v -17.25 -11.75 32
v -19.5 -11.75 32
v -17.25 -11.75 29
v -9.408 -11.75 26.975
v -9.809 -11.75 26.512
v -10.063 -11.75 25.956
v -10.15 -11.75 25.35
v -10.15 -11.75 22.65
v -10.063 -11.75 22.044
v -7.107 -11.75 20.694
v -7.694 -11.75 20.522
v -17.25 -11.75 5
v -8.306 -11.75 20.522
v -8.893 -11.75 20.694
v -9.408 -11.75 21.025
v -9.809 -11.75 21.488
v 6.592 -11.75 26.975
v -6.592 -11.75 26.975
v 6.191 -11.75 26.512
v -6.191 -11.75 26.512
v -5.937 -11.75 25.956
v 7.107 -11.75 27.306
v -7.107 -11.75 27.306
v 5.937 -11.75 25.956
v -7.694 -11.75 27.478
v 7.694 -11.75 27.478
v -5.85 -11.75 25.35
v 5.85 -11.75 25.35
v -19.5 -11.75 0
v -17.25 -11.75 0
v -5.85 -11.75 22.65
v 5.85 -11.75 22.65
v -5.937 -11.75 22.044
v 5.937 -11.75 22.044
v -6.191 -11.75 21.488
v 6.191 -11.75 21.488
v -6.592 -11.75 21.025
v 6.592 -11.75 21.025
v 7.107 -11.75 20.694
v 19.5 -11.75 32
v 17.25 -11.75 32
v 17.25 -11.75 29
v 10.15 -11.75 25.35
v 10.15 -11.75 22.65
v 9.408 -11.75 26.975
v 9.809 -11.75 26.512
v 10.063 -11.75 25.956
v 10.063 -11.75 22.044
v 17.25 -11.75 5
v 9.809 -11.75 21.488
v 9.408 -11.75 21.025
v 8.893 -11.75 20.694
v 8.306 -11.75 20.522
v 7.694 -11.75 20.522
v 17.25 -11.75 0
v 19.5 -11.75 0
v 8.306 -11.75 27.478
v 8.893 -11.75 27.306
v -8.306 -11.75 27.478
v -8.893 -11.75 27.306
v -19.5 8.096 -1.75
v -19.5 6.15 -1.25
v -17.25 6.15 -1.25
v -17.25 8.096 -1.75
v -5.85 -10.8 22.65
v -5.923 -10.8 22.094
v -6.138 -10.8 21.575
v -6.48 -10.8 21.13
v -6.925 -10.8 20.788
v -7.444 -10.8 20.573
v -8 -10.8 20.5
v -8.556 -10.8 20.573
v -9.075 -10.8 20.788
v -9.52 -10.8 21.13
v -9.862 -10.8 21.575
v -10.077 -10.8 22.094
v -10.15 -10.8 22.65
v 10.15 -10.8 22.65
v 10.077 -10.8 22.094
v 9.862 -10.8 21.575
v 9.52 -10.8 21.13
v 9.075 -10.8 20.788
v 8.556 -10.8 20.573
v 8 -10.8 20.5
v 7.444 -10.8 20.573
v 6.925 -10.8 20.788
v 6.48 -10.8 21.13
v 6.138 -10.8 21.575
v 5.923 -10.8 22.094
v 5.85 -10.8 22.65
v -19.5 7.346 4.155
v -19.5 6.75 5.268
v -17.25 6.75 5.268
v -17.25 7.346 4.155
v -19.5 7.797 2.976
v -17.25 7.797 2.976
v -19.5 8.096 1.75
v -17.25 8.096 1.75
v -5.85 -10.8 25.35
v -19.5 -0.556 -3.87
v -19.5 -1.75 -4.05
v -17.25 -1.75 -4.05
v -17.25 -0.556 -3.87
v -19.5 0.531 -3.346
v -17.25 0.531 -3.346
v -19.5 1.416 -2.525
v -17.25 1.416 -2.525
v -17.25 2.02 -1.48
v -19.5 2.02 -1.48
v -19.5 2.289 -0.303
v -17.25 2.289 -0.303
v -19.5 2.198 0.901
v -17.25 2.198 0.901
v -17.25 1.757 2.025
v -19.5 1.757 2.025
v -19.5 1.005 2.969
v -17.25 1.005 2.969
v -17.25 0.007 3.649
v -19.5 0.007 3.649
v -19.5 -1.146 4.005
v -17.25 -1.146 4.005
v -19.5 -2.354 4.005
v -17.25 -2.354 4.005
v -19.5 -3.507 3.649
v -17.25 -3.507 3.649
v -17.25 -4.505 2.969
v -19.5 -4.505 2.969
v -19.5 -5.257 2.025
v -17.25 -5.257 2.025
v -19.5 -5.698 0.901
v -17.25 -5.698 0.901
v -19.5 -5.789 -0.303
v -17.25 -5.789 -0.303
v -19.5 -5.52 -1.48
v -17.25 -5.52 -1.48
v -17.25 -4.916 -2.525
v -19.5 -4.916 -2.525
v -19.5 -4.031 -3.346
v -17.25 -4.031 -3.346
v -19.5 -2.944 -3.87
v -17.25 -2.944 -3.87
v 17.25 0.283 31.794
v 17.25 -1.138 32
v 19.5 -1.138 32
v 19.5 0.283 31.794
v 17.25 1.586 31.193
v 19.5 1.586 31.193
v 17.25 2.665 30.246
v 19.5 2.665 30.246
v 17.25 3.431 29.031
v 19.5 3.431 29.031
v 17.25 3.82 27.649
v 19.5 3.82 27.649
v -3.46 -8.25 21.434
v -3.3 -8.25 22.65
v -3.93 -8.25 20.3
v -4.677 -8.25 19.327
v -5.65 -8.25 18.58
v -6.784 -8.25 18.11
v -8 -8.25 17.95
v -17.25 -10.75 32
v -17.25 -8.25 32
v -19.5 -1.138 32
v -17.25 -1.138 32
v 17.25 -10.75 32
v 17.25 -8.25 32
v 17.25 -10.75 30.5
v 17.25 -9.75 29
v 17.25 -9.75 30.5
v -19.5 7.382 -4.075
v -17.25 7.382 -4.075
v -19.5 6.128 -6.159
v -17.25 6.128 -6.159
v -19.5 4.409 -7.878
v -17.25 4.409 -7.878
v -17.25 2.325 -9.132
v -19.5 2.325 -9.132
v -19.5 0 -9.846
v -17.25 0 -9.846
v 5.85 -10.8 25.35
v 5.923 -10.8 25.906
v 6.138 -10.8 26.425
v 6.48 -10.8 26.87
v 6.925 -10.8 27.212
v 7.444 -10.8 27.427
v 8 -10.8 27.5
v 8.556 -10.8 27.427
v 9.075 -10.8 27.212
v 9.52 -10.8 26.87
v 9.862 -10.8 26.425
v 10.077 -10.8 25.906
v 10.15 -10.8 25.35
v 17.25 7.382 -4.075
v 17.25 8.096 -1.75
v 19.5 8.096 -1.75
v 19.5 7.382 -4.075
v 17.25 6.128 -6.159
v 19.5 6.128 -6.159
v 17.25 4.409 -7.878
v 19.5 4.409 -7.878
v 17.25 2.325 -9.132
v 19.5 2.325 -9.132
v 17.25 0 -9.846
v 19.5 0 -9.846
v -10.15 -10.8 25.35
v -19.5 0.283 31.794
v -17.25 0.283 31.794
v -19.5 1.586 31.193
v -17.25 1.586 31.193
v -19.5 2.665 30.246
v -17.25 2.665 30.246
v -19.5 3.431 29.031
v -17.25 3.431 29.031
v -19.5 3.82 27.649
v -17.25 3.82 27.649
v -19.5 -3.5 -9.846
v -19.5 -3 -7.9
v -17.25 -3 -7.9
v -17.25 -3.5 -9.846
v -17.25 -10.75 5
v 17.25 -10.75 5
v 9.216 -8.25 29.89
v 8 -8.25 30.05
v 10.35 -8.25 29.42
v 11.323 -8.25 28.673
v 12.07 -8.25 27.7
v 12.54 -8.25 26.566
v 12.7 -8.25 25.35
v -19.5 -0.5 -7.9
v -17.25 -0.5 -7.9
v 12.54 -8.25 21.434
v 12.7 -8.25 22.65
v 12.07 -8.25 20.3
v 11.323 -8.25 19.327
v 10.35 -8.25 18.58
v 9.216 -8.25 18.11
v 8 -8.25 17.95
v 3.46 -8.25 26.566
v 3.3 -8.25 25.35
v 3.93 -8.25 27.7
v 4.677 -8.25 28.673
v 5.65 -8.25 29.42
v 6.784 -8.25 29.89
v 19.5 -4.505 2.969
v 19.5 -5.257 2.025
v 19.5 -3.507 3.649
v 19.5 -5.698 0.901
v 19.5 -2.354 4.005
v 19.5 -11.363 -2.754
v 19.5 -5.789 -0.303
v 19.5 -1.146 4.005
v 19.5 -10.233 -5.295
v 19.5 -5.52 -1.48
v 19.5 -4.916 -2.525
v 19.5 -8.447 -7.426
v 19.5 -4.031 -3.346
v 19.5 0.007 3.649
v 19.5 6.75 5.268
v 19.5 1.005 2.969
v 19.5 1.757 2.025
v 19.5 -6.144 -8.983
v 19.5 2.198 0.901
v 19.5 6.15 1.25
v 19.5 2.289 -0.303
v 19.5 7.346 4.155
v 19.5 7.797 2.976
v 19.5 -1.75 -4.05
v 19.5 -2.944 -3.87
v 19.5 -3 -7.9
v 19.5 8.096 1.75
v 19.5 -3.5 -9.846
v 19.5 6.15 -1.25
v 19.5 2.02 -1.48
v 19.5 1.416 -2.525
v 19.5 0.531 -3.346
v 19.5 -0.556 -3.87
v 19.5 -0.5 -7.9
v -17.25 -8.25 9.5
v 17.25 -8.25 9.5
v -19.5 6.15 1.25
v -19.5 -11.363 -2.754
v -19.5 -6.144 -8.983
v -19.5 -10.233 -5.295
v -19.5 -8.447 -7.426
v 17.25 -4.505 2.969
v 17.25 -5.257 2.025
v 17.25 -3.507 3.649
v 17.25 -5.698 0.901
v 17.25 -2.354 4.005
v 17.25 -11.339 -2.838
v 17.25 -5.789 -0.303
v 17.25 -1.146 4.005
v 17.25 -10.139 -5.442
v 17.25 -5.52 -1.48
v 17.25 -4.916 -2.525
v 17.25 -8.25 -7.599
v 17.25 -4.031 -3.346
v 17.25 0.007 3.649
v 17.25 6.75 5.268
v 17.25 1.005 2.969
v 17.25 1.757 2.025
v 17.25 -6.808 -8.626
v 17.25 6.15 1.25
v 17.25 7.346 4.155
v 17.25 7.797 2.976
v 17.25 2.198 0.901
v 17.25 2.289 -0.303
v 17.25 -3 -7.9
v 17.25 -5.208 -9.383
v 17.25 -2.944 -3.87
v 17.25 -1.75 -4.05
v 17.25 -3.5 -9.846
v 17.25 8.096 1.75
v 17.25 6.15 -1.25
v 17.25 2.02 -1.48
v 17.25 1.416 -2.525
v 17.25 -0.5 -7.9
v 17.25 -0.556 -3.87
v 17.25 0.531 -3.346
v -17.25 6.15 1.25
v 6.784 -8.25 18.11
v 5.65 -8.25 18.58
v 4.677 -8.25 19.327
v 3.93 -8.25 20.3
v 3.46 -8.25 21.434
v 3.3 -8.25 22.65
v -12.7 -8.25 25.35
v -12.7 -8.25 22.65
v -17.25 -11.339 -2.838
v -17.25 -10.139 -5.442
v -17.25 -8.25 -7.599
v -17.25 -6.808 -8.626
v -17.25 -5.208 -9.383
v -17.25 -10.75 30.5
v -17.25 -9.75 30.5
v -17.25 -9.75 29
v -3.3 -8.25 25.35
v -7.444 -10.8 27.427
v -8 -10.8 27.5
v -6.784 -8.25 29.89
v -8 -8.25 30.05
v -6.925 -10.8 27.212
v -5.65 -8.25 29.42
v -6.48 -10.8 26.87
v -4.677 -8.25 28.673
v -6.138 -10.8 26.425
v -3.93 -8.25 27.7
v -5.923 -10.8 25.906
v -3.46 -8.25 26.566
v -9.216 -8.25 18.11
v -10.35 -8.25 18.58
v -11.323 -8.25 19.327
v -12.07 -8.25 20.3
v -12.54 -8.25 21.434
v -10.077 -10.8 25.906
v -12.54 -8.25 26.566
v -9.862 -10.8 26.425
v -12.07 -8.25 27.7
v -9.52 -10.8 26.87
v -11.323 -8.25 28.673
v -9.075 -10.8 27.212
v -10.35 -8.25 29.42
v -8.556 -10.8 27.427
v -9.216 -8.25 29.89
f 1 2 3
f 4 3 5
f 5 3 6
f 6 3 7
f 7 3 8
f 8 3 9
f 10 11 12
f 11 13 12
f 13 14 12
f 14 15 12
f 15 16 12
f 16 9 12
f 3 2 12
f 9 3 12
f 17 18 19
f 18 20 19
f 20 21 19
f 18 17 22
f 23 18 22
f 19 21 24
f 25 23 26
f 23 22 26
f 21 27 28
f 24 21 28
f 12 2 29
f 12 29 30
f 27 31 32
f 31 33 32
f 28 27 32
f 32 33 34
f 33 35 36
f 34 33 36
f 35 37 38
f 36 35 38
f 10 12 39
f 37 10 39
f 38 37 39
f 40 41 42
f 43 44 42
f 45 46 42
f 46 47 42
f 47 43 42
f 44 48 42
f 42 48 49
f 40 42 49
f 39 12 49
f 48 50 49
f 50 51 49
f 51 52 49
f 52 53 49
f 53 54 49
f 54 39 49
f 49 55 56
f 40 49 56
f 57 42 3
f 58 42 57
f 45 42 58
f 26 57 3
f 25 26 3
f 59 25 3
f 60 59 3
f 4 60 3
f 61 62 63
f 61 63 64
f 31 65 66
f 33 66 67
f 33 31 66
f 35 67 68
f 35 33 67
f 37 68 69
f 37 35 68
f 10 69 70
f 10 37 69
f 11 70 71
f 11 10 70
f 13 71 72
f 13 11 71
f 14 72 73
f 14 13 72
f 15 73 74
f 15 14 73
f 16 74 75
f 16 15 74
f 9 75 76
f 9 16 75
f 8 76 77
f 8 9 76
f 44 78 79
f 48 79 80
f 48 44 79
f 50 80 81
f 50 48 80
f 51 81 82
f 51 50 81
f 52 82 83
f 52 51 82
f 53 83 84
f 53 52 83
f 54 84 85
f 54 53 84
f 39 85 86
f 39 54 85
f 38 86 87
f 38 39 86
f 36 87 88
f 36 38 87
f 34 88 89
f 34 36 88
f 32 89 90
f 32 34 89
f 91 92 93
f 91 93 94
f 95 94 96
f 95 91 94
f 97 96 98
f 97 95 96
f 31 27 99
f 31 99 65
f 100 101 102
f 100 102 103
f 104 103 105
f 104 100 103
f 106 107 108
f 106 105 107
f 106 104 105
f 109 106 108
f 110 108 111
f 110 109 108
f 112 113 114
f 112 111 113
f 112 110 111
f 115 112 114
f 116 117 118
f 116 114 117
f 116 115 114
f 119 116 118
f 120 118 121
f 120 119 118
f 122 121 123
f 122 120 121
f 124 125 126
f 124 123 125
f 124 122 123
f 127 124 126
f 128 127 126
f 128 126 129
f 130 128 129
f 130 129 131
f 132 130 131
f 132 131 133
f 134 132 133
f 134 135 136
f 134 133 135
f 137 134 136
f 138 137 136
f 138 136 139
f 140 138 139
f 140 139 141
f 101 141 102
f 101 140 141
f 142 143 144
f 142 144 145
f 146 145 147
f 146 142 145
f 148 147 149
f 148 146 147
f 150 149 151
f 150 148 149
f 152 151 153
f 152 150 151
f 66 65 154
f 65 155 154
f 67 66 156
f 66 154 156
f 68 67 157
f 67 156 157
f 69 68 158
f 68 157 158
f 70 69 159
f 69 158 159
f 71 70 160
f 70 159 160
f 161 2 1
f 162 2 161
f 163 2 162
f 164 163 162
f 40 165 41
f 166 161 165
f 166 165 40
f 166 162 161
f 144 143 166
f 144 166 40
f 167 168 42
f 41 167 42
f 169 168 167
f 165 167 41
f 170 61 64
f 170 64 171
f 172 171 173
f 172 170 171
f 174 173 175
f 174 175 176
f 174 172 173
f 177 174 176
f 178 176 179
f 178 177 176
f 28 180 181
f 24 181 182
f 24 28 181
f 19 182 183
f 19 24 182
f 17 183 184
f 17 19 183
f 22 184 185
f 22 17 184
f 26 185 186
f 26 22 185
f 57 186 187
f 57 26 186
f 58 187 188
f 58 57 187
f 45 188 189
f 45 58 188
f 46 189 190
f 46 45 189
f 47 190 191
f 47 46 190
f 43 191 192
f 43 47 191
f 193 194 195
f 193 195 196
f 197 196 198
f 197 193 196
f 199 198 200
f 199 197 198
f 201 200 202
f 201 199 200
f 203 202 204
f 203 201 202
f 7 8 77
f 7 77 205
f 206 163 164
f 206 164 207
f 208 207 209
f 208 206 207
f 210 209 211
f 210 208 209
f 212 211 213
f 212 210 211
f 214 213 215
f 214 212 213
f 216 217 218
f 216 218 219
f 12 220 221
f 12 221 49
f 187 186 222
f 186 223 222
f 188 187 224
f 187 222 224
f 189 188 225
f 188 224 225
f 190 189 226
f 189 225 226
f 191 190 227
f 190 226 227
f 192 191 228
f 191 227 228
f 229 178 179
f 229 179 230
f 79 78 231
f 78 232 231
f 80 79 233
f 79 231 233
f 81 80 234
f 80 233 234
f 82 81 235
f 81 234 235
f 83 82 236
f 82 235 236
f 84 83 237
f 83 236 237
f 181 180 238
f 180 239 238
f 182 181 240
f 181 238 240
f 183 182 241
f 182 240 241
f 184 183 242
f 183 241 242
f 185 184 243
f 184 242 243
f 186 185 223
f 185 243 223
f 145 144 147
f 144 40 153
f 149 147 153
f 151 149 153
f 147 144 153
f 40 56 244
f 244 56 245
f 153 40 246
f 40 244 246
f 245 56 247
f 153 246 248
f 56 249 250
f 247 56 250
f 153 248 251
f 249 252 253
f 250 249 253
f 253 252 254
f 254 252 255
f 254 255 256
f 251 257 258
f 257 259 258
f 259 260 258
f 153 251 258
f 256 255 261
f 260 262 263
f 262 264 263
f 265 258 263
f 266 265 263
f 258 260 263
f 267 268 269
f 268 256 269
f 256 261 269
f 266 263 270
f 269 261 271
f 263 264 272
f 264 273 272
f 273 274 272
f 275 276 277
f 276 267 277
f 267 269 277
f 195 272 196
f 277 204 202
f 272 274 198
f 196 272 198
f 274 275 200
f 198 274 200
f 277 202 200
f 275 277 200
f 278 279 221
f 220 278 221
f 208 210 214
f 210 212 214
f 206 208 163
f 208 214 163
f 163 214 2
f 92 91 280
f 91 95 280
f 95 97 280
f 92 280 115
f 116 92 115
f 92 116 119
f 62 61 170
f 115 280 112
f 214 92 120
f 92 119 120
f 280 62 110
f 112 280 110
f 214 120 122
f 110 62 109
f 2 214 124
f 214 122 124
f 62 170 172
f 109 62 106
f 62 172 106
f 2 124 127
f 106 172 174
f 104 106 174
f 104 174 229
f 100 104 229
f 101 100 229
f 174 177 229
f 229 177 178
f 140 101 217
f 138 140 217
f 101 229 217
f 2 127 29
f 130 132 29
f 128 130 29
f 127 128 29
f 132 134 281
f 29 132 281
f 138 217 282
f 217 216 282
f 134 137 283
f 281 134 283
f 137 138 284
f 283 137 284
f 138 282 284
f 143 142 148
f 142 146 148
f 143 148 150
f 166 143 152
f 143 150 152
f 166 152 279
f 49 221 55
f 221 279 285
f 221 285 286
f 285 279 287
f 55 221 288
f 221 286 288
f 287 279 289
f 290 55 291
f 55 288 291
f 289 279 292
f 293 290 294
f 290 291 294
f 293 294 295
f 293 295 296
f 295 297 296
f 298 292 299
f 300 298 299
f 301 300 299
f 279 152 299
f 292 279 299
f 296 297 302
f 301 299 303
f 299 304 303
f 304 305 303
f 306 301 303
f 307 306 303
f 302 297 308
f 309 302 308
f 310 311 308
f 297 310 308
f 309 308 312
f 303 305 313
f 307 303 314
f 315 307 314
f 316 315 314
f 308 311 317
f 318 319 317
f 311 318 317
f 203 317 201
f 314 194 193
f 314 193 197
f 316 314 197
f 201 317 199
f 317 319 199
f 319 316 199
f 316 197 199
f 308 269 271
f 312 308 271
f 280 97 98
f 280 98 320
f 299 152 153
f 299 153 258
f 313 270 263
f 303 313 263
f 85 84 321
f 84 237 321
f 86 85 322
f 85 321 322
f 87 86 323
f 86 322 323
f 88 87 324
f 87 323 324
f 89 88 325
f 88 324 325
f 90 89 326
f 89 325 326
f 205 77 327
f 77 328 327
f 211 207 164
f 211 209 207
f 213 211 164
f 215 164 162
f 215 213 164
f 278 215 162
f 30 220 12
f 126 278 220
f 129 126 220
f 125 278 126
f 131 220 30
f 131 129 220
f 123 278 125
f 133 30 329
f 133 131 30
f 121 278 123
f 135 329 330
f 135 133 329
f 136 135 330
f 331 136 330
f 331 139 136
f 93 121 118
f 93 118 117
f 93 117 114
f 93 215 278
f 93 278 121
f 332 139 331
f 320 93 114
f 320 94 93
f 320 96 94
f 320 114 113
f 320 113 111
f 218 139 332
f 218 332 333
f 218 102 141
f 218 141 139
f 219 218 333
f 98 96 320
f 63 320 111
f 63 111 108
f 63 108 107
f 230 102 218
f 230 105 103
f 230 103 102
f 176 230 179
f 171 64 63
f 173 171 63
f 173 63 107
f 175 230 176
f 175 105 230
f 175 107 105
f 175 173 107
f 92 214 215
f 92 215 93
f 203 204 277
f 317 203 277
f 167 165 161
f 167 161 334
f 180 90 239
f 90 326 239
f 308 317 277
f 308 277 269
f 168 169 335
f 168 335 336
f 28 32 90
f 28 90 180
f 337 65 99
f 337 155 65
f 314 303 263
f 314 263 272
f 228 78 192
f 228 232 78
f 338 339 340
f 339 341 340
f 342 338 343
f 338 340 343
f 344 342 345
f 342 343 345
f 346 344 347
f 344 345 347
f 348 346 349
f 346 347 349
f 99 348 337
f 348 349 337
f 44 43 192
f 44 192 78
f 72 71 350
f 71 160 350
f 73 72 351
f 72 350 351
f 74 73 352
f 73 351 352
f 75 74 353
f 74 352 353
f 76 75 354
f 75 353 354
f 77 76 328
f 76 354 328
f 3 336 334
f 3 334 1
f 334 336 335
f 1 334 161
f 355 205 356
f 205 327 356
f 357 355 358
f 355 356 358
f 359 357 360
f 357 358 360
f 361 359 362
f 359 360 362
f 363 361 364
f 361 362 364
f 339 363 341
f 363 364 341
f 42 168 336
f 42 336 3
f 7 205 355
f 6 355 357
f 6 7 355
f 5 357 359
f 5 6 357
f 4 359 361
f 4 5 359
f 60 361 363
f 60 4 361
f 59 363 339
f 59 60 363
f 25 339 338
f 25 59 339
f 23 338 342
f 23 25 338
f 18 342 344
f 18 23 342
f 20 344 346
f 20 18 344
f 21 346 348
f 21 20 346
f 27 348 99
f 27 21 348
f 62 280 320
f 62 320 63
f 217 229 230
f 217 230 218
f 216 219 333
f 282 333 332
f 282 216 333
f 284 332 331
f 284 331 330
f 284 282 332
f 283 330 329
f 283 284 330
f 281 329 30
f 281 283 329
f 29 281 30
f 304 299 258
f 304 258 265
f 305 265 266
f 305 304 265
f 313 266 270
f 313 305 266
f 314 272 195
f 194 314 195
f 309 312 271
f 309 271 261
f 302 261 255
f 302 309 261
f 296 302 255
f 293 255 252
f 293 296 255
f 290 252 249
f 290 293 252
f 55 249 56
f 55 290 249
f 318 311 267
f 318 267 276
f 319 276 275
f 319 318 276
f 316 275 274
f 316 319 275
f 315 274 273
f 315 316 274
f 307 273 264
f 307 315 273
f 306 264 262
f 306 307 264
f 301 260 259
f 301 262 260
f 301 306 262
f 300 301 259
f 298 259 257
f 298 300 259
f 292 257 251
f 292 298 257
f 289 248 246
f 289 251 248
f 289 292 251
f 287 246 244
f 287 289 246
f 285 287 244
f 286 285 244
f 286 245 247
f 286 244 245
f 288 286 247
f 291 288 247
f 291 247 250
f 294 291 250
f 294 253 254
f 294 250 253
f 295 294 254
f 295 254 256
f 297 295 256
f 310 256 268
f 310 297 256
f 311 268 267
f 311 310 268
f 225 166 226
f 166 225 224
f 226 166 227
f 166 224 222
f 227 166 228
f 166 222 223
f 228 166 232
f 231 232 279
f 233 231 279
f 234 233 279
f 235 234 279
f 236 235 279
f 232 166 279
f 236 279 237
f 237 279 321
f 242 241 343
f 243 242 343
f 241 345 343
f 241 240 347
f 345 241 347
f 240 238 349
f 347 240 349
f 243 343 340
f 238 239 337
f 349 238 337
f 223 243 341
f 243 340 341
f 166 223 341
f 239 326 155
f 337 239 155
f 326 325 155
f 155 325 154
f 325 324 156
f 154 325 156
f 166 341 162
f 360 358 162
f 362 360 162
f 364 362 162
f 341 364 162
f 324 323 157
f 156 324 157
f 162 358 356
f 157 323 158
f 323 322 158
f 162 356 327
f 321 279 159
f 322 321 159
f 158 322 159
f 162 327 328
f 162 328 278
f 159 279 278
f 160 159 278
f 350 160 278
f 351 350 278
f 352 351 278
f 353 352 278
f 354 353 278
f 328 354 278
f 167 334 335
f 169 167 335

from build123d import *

# Parameters (mm, degrees)
BODY_DEPTH                                      = 32
BODY_DEPTH_BACK                                 = 15
PIVOT_HOLE_DEPTH                                = 40.272286666
PIVOT_HOLE_DEPTH_BACK                           = 40.272286666
PIVOT_HOLE_SKETCH_R                             = 4.05
OUTSIDE_SHAPE_CUT_OUT_DEPTH                     = 40.272286666
OUTSIDE_SHAPE_CUT_OUT_DEPTH_BACK                = 40.272286666
OUTSIDE_SHAPE_CUT_OUT_SKETCH_W                  = 49
OUTSIDE_SHAPE_CUT_OUT_SKETCH_H                  = 22
INSIDE_START                                    = 17.25
INSIDE_SHAPE_CUT_OUT_DEPTH                      = 34.5
F_2_START                                       = -11.75
F_2_LATERAL_SLOTS_ORIENTED_LONGITUDINALLY_DEPTH = 3.5


with BuildPart() as part:
    # Profile Sketch → Body (new, two sides: drawn at the far end of the back side and taken through both)
    with BuildSketch(Plane.XY.offset(-BODY_DEPTH_BACK)):
        Polygon((-19.5, -11.75), (19.5, -11.75), (19.5, 8.25), (17.25, 8.25), (17.25, -8.25), (-17.25, -8.25), (-17.25, 8.25), (-19.5, 8.25), align=None)
    extrude(amount=BODY_DEPTH + BODY_DEPTH_BACK)

    # Pivot Hole Sketch → Pivot Hole (cut, two sides: drawn at the far end of the back side and taken through both)
    with BuildSketch(Plane(origin=(0, 0, 0), x_dir=(0, 0, -1), z_dir=(1, 0, 0)).offset(-PIVOT_HOLE_DEPTH_BACK)):
        with Locations((0, -1.75)):
            Circle(PIVOT_HOLE_SKETCH_R)
    extrude(amount=PIVOT_HOLE_DEPTH + PIVOT_HOLE_DEPTH_BACK, mode=Mode.SUBTRACT)

    # Outside Shape Cut Out Sketch → Outside Shape Cut Out (cut, two sides: drawn at the far end of the back side and taken through both)
    with BuildSketch(Plane(origin=(0, 0, 0), x_dir=(0, 0, -1), z_dir=(1, 0, 0)).offset(-OUTSIDE_SHAPE_CUT_OUT_DEPTH_BACK)):
        with Locations((-9.5, -2.75)):
            Rectangle(OUTSIDE_SHAPE_CUT_OUT_SKETCH_W, OUTSIDE_SHAPE_CUT_OUT_SKETCH_H)
        with BuildLine():
            Line((-27.649101987, 3.819656009), (-5.267826876, 6.75))
            ThreePointArc((-5.267826876, 6.75), (-3.57284062, 7.589957703), (-1.75, 8.095684334))
            Line((-1.75, 8.095684334), (-1.25, 6.15))
            Line((-1.25, 6.15), (1.25, 6.15))
            Line((1.25, 6.15), (1.75, 8.095684334))
            ThreePointArc((1.75, 8.095684334), (7.071067812, 5.321067812), (9.845684334, 0))
            Line((9.845684334, 0), (7.9, -0.5))
            Line((7.9, -0.5), (7.9, -3))
            Line((7.9, -3), (9.845684334, -3.5))
            ThreePointArc((9.845684334, -3.5), (6.422616289, -9.414854858), (0, -11.75))
            Line((0, -11.75), (-32, -11.75))
            Line((-32, -11.75), (-32, -1.138031619))
            ThreePointArc((-32, -1.138031619), (-30.758025408, 2.160035244), (-27.649101987, 3.819656009))
        make_face(mode=Mode.SUBTRACT)
    extrude(amount=OUTSIDE_SHAPE_CUT_OUT_DEPTH + OUTSIDE_SHAPE_CUT_OUT_DEPTH_BACK, mode=Mode.SUBTRACT)

    # Inside Shape Cut Out Sketch → Inside Shape Cut Out (cut)
    with BuildSketch(Plane(origin=(0, 0, 0), x_dir=(0, 0, -1), z_dir=(1, 0, 0)).offset(INSIDE_START)):
        Polygon((-29, -9.75), (-29, -11.75), (-32, -11.75), (-32, -10.75), (-30.5, -10.75), (-30.5, -9.75), align=None)
        Polygon((-9.5, -8.25), (-5, -10.75), (-5, -11.75), (7.599342077, -11.75), (7.599342077, -8.25), align=None)
    extrude(amount=-INSIDE_SHAPE_CUT_OUT_DEPTH, mode=Mode.SUBTRACT)

    # 2 Lateral Slots Oriented Longitudinally: read off the stored shape, not the designer's step
    # 2 Lateral Slots Oriented Longitudina 2 → 2 Lateral Slots Oriented Longitudinally (cut)
    with BuildSketch(Plane(origin=(0, 0, 0), x_dir=(1, 0, 0), z_dir=(0, 1, 0)).offset(F_2_START)):
        with BuildLine():
            Line((10.15, -25.35), (10.15, -22.65))
            ThreePointArc((10.15, -22.65), (8, -20.5), (5.85, -22.65))
            Line((5.85, -22.65), (5.85, -25.35))
            ThreePointArc((5.85, -25.35), (8, -27.5), (10.15, -25.35))
        make_face()
        with BuildLine():
            Line((-5.85, -25.35), (-5.85, -22.65))
            ThreePointArc((-5.85, -22.65), (-8, -20.5), (-10.15, -22.65))
            Line((-10.15, -22.65), (-10.15, -25.35))
            ThreePointArc((-10.15, -25.35), (-8, -27.5), (-5.85, -25.35))
        make_face()
    extrude(amount=F_2_LATERAL_SLOTS_ORIENTED_LONGITUDINALLY_DEPTH, mode=Mode.SUBTRACT)

    # 2 Lateral Slots Oriented Longitudina 3: loft between two sections, ruled curve by curve
    f_2_lateral_slots_oriented_longitudina_3_from = [
        Edge.make_three_point_arc((10.15, -10.8, 22.65), (9.52027958, -10.8, 21.12972042), (8, -10.8, 20.5)),
        Edge.make_three_point_arc((8, -10.8, 20.5), (6.47972042, -10.8, 21.12972042), (5.85, -10.8, 22.65)),
        Edge.make_three_point_arc((5.85, -10.8, 25.35), (6.47972042, -10.8, 26.87027958), (8, -10.8, 27.5)),
        Edge.make_three_point_arc((8, -10.8, 27.5), (9.52027958, -10.8, 26.87027958), (10.15, -10.8, 25.35)),
        Edge.make_line((5.85, -10.8, 22.65), (5.85, -10.8, 25.35)),
        Edge.make_line((10.15, -10.8, 22.65), (10.15, -10.8, 25.35)),
    ]
    f_2_lateral_slots_oriented_longitudina_3_to = [
        Edge.make_three_point_arc((12.7, -8.25, 22.65), (11.323401872, -8.25, 19.326598128), (8, -8.25, 17.95)),
        Edge.make_three_point_arc((8, -8.25, 17.95), (4.676598128, -8.25, 19.326598128), (3.3, -8.25, 22.65)),
        Edge.make_three_point_arc((3.3, -8.25, 25.35), (4.676598128, -8.25, 28.673401872), (8, -8.25, 30.05)),
        Edge.make_three_point_arc((8, -8.25, 30.05), (11.323401872, -8.25, 28.673401872), (12.7, -8.25, 25.35)),
        Edge.make_line((3.3, -8.25, 22.65), (3.3, -8.25, 25.35)),
        Edge.make_line((12.7, -8.25, 22.65), (12.7, -8.25, 25.35)),
    ]
    f_2_lateral_slots_oriented_longitudina_3 = Solid(Shell([*[Face.make_surface_from_curves(f_2_lateral_slots_oriented_longitudina_3_from[k], f_2_lateral_slots_oriented_longitudina_3_to[k]) for k in range(6)], Face(Wire(f_2_lateral_slots_oriented_longitudina_3_from)), Face(Wire(f_2_lateral_slots_oriented_longitudina_3_to))]))
    add(f_2_lateral_slots_oriented_longitudina_3, mode=Mode.SUBTRACT)

    # 2 Lateral Slots Oriented Longitudina 4: loft between two sections, ruled curve by curve
    f_2_lateral_slots_oriented_longitudina_4_from = [
        Edge.make_three_point_arc((-5.85, -10.8, 22.65), (-6.47972042, -10.8, 21.12972042), (-8, -10.8, 20.5)),
        Edge.make_three_point_arc((-8, -10.8, 20.5), (-9.52027958, -10.8, 21.12972042), (-10.15, -10.8, 22.65)),
        Edge.make_three_point_arc((-10.15, -10.8, 25.35), (-9.52027958, -10.8, 26.87027958), (-8, -10.8, 27.5)),
        Edge.make_three_point_arc((-8, -10.8, 27.5), (-6.47972042, -10.8, 26.87027958), (-5.85, -10.8, 25.35)),
        Edge.make_line((-10.15, -10.8, 22.65), (-10.15, -10.8, 25.35)),
        Edge.make_line((-5.85, -10.8, 22.65), (-5.85, -10.8, 25.35)),
    ]
    f_2_lateral_slots_oriented_longitudina_4_to = [
        Edge.make_three_point_arc((-3.3, -8.25, 22.65), (-4.676598128, -8.25, 19.326598128), (-8, -8.25, 17.95)),
        Edge.make_three_point_arc((-8, -8.25, 17.95), (-11.323401872, -8.25, 19.326598128), (-12.7, -8.25, 22.65)),
        Edge.make_three_point_arc((-12.7, -8.25, 25.35), (-11.323401872, -8.25, 28.673401872), (-8, -8.25, 30.05)),
        Edge.make_three_point_arc((-8, -8.25, 30.05), (-4.676598128, -8.25, 28.673401872), (-3.3, -8.25, 25.35)),
        Edge.make_line((-12.7, -8.25, 22.65), (-12.7, -8.25, 25.35)),
        Edge.make_line((-3.3, -8.25, 22.65), (-3.3, -8.25, 25.35)),
    ]
    f_2_lateral_slots_oriented_longitudina_4 = Solid(Shell([*[Face.make_surface_from_curves(f_2_lateral_slots_oriented_longitudina_4_from[k], f_2_lateral_slots_oriented_longitudina_4_to[k]) for k in range(6)], Face(Wire(f_2_lateral_slots_oriented_longitudina_4_from)), Face(Wire(f_2_lateral_slots_oriented_longitudina_4_to))]))
    add(f_2_lateral_slots_oriented_longitudina_4, mode=Mode.SUBTRACT)


solid = part.part
